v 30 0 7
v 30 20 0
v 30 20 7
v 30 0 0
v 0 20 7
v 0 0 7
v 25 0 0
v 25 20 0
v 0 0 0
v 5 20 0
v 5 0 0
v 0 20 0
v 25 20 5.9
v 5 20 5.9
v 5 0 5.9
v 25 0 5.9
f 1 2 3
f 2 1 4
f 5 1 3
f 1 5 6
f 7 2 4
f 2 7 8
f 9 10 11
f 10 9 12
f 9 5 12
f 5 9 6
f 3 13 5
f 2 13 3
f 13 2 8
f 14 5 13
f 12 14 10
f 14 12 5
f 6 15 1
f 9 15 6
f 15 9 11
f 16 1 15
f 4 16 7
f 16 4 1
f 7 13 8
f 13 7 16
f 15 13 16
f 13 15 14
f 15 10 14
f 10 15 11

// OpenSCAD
Height = 7;
Width = 30;
Depth = 20;
Tower = 5;
Bridge = 1;

difference(){
    cube([Width,Depth,Height]);
    translate([Tower,-.1,-.1])cube([Width-(2*Tower),Depth+.2,Height-Bridge]);
}
